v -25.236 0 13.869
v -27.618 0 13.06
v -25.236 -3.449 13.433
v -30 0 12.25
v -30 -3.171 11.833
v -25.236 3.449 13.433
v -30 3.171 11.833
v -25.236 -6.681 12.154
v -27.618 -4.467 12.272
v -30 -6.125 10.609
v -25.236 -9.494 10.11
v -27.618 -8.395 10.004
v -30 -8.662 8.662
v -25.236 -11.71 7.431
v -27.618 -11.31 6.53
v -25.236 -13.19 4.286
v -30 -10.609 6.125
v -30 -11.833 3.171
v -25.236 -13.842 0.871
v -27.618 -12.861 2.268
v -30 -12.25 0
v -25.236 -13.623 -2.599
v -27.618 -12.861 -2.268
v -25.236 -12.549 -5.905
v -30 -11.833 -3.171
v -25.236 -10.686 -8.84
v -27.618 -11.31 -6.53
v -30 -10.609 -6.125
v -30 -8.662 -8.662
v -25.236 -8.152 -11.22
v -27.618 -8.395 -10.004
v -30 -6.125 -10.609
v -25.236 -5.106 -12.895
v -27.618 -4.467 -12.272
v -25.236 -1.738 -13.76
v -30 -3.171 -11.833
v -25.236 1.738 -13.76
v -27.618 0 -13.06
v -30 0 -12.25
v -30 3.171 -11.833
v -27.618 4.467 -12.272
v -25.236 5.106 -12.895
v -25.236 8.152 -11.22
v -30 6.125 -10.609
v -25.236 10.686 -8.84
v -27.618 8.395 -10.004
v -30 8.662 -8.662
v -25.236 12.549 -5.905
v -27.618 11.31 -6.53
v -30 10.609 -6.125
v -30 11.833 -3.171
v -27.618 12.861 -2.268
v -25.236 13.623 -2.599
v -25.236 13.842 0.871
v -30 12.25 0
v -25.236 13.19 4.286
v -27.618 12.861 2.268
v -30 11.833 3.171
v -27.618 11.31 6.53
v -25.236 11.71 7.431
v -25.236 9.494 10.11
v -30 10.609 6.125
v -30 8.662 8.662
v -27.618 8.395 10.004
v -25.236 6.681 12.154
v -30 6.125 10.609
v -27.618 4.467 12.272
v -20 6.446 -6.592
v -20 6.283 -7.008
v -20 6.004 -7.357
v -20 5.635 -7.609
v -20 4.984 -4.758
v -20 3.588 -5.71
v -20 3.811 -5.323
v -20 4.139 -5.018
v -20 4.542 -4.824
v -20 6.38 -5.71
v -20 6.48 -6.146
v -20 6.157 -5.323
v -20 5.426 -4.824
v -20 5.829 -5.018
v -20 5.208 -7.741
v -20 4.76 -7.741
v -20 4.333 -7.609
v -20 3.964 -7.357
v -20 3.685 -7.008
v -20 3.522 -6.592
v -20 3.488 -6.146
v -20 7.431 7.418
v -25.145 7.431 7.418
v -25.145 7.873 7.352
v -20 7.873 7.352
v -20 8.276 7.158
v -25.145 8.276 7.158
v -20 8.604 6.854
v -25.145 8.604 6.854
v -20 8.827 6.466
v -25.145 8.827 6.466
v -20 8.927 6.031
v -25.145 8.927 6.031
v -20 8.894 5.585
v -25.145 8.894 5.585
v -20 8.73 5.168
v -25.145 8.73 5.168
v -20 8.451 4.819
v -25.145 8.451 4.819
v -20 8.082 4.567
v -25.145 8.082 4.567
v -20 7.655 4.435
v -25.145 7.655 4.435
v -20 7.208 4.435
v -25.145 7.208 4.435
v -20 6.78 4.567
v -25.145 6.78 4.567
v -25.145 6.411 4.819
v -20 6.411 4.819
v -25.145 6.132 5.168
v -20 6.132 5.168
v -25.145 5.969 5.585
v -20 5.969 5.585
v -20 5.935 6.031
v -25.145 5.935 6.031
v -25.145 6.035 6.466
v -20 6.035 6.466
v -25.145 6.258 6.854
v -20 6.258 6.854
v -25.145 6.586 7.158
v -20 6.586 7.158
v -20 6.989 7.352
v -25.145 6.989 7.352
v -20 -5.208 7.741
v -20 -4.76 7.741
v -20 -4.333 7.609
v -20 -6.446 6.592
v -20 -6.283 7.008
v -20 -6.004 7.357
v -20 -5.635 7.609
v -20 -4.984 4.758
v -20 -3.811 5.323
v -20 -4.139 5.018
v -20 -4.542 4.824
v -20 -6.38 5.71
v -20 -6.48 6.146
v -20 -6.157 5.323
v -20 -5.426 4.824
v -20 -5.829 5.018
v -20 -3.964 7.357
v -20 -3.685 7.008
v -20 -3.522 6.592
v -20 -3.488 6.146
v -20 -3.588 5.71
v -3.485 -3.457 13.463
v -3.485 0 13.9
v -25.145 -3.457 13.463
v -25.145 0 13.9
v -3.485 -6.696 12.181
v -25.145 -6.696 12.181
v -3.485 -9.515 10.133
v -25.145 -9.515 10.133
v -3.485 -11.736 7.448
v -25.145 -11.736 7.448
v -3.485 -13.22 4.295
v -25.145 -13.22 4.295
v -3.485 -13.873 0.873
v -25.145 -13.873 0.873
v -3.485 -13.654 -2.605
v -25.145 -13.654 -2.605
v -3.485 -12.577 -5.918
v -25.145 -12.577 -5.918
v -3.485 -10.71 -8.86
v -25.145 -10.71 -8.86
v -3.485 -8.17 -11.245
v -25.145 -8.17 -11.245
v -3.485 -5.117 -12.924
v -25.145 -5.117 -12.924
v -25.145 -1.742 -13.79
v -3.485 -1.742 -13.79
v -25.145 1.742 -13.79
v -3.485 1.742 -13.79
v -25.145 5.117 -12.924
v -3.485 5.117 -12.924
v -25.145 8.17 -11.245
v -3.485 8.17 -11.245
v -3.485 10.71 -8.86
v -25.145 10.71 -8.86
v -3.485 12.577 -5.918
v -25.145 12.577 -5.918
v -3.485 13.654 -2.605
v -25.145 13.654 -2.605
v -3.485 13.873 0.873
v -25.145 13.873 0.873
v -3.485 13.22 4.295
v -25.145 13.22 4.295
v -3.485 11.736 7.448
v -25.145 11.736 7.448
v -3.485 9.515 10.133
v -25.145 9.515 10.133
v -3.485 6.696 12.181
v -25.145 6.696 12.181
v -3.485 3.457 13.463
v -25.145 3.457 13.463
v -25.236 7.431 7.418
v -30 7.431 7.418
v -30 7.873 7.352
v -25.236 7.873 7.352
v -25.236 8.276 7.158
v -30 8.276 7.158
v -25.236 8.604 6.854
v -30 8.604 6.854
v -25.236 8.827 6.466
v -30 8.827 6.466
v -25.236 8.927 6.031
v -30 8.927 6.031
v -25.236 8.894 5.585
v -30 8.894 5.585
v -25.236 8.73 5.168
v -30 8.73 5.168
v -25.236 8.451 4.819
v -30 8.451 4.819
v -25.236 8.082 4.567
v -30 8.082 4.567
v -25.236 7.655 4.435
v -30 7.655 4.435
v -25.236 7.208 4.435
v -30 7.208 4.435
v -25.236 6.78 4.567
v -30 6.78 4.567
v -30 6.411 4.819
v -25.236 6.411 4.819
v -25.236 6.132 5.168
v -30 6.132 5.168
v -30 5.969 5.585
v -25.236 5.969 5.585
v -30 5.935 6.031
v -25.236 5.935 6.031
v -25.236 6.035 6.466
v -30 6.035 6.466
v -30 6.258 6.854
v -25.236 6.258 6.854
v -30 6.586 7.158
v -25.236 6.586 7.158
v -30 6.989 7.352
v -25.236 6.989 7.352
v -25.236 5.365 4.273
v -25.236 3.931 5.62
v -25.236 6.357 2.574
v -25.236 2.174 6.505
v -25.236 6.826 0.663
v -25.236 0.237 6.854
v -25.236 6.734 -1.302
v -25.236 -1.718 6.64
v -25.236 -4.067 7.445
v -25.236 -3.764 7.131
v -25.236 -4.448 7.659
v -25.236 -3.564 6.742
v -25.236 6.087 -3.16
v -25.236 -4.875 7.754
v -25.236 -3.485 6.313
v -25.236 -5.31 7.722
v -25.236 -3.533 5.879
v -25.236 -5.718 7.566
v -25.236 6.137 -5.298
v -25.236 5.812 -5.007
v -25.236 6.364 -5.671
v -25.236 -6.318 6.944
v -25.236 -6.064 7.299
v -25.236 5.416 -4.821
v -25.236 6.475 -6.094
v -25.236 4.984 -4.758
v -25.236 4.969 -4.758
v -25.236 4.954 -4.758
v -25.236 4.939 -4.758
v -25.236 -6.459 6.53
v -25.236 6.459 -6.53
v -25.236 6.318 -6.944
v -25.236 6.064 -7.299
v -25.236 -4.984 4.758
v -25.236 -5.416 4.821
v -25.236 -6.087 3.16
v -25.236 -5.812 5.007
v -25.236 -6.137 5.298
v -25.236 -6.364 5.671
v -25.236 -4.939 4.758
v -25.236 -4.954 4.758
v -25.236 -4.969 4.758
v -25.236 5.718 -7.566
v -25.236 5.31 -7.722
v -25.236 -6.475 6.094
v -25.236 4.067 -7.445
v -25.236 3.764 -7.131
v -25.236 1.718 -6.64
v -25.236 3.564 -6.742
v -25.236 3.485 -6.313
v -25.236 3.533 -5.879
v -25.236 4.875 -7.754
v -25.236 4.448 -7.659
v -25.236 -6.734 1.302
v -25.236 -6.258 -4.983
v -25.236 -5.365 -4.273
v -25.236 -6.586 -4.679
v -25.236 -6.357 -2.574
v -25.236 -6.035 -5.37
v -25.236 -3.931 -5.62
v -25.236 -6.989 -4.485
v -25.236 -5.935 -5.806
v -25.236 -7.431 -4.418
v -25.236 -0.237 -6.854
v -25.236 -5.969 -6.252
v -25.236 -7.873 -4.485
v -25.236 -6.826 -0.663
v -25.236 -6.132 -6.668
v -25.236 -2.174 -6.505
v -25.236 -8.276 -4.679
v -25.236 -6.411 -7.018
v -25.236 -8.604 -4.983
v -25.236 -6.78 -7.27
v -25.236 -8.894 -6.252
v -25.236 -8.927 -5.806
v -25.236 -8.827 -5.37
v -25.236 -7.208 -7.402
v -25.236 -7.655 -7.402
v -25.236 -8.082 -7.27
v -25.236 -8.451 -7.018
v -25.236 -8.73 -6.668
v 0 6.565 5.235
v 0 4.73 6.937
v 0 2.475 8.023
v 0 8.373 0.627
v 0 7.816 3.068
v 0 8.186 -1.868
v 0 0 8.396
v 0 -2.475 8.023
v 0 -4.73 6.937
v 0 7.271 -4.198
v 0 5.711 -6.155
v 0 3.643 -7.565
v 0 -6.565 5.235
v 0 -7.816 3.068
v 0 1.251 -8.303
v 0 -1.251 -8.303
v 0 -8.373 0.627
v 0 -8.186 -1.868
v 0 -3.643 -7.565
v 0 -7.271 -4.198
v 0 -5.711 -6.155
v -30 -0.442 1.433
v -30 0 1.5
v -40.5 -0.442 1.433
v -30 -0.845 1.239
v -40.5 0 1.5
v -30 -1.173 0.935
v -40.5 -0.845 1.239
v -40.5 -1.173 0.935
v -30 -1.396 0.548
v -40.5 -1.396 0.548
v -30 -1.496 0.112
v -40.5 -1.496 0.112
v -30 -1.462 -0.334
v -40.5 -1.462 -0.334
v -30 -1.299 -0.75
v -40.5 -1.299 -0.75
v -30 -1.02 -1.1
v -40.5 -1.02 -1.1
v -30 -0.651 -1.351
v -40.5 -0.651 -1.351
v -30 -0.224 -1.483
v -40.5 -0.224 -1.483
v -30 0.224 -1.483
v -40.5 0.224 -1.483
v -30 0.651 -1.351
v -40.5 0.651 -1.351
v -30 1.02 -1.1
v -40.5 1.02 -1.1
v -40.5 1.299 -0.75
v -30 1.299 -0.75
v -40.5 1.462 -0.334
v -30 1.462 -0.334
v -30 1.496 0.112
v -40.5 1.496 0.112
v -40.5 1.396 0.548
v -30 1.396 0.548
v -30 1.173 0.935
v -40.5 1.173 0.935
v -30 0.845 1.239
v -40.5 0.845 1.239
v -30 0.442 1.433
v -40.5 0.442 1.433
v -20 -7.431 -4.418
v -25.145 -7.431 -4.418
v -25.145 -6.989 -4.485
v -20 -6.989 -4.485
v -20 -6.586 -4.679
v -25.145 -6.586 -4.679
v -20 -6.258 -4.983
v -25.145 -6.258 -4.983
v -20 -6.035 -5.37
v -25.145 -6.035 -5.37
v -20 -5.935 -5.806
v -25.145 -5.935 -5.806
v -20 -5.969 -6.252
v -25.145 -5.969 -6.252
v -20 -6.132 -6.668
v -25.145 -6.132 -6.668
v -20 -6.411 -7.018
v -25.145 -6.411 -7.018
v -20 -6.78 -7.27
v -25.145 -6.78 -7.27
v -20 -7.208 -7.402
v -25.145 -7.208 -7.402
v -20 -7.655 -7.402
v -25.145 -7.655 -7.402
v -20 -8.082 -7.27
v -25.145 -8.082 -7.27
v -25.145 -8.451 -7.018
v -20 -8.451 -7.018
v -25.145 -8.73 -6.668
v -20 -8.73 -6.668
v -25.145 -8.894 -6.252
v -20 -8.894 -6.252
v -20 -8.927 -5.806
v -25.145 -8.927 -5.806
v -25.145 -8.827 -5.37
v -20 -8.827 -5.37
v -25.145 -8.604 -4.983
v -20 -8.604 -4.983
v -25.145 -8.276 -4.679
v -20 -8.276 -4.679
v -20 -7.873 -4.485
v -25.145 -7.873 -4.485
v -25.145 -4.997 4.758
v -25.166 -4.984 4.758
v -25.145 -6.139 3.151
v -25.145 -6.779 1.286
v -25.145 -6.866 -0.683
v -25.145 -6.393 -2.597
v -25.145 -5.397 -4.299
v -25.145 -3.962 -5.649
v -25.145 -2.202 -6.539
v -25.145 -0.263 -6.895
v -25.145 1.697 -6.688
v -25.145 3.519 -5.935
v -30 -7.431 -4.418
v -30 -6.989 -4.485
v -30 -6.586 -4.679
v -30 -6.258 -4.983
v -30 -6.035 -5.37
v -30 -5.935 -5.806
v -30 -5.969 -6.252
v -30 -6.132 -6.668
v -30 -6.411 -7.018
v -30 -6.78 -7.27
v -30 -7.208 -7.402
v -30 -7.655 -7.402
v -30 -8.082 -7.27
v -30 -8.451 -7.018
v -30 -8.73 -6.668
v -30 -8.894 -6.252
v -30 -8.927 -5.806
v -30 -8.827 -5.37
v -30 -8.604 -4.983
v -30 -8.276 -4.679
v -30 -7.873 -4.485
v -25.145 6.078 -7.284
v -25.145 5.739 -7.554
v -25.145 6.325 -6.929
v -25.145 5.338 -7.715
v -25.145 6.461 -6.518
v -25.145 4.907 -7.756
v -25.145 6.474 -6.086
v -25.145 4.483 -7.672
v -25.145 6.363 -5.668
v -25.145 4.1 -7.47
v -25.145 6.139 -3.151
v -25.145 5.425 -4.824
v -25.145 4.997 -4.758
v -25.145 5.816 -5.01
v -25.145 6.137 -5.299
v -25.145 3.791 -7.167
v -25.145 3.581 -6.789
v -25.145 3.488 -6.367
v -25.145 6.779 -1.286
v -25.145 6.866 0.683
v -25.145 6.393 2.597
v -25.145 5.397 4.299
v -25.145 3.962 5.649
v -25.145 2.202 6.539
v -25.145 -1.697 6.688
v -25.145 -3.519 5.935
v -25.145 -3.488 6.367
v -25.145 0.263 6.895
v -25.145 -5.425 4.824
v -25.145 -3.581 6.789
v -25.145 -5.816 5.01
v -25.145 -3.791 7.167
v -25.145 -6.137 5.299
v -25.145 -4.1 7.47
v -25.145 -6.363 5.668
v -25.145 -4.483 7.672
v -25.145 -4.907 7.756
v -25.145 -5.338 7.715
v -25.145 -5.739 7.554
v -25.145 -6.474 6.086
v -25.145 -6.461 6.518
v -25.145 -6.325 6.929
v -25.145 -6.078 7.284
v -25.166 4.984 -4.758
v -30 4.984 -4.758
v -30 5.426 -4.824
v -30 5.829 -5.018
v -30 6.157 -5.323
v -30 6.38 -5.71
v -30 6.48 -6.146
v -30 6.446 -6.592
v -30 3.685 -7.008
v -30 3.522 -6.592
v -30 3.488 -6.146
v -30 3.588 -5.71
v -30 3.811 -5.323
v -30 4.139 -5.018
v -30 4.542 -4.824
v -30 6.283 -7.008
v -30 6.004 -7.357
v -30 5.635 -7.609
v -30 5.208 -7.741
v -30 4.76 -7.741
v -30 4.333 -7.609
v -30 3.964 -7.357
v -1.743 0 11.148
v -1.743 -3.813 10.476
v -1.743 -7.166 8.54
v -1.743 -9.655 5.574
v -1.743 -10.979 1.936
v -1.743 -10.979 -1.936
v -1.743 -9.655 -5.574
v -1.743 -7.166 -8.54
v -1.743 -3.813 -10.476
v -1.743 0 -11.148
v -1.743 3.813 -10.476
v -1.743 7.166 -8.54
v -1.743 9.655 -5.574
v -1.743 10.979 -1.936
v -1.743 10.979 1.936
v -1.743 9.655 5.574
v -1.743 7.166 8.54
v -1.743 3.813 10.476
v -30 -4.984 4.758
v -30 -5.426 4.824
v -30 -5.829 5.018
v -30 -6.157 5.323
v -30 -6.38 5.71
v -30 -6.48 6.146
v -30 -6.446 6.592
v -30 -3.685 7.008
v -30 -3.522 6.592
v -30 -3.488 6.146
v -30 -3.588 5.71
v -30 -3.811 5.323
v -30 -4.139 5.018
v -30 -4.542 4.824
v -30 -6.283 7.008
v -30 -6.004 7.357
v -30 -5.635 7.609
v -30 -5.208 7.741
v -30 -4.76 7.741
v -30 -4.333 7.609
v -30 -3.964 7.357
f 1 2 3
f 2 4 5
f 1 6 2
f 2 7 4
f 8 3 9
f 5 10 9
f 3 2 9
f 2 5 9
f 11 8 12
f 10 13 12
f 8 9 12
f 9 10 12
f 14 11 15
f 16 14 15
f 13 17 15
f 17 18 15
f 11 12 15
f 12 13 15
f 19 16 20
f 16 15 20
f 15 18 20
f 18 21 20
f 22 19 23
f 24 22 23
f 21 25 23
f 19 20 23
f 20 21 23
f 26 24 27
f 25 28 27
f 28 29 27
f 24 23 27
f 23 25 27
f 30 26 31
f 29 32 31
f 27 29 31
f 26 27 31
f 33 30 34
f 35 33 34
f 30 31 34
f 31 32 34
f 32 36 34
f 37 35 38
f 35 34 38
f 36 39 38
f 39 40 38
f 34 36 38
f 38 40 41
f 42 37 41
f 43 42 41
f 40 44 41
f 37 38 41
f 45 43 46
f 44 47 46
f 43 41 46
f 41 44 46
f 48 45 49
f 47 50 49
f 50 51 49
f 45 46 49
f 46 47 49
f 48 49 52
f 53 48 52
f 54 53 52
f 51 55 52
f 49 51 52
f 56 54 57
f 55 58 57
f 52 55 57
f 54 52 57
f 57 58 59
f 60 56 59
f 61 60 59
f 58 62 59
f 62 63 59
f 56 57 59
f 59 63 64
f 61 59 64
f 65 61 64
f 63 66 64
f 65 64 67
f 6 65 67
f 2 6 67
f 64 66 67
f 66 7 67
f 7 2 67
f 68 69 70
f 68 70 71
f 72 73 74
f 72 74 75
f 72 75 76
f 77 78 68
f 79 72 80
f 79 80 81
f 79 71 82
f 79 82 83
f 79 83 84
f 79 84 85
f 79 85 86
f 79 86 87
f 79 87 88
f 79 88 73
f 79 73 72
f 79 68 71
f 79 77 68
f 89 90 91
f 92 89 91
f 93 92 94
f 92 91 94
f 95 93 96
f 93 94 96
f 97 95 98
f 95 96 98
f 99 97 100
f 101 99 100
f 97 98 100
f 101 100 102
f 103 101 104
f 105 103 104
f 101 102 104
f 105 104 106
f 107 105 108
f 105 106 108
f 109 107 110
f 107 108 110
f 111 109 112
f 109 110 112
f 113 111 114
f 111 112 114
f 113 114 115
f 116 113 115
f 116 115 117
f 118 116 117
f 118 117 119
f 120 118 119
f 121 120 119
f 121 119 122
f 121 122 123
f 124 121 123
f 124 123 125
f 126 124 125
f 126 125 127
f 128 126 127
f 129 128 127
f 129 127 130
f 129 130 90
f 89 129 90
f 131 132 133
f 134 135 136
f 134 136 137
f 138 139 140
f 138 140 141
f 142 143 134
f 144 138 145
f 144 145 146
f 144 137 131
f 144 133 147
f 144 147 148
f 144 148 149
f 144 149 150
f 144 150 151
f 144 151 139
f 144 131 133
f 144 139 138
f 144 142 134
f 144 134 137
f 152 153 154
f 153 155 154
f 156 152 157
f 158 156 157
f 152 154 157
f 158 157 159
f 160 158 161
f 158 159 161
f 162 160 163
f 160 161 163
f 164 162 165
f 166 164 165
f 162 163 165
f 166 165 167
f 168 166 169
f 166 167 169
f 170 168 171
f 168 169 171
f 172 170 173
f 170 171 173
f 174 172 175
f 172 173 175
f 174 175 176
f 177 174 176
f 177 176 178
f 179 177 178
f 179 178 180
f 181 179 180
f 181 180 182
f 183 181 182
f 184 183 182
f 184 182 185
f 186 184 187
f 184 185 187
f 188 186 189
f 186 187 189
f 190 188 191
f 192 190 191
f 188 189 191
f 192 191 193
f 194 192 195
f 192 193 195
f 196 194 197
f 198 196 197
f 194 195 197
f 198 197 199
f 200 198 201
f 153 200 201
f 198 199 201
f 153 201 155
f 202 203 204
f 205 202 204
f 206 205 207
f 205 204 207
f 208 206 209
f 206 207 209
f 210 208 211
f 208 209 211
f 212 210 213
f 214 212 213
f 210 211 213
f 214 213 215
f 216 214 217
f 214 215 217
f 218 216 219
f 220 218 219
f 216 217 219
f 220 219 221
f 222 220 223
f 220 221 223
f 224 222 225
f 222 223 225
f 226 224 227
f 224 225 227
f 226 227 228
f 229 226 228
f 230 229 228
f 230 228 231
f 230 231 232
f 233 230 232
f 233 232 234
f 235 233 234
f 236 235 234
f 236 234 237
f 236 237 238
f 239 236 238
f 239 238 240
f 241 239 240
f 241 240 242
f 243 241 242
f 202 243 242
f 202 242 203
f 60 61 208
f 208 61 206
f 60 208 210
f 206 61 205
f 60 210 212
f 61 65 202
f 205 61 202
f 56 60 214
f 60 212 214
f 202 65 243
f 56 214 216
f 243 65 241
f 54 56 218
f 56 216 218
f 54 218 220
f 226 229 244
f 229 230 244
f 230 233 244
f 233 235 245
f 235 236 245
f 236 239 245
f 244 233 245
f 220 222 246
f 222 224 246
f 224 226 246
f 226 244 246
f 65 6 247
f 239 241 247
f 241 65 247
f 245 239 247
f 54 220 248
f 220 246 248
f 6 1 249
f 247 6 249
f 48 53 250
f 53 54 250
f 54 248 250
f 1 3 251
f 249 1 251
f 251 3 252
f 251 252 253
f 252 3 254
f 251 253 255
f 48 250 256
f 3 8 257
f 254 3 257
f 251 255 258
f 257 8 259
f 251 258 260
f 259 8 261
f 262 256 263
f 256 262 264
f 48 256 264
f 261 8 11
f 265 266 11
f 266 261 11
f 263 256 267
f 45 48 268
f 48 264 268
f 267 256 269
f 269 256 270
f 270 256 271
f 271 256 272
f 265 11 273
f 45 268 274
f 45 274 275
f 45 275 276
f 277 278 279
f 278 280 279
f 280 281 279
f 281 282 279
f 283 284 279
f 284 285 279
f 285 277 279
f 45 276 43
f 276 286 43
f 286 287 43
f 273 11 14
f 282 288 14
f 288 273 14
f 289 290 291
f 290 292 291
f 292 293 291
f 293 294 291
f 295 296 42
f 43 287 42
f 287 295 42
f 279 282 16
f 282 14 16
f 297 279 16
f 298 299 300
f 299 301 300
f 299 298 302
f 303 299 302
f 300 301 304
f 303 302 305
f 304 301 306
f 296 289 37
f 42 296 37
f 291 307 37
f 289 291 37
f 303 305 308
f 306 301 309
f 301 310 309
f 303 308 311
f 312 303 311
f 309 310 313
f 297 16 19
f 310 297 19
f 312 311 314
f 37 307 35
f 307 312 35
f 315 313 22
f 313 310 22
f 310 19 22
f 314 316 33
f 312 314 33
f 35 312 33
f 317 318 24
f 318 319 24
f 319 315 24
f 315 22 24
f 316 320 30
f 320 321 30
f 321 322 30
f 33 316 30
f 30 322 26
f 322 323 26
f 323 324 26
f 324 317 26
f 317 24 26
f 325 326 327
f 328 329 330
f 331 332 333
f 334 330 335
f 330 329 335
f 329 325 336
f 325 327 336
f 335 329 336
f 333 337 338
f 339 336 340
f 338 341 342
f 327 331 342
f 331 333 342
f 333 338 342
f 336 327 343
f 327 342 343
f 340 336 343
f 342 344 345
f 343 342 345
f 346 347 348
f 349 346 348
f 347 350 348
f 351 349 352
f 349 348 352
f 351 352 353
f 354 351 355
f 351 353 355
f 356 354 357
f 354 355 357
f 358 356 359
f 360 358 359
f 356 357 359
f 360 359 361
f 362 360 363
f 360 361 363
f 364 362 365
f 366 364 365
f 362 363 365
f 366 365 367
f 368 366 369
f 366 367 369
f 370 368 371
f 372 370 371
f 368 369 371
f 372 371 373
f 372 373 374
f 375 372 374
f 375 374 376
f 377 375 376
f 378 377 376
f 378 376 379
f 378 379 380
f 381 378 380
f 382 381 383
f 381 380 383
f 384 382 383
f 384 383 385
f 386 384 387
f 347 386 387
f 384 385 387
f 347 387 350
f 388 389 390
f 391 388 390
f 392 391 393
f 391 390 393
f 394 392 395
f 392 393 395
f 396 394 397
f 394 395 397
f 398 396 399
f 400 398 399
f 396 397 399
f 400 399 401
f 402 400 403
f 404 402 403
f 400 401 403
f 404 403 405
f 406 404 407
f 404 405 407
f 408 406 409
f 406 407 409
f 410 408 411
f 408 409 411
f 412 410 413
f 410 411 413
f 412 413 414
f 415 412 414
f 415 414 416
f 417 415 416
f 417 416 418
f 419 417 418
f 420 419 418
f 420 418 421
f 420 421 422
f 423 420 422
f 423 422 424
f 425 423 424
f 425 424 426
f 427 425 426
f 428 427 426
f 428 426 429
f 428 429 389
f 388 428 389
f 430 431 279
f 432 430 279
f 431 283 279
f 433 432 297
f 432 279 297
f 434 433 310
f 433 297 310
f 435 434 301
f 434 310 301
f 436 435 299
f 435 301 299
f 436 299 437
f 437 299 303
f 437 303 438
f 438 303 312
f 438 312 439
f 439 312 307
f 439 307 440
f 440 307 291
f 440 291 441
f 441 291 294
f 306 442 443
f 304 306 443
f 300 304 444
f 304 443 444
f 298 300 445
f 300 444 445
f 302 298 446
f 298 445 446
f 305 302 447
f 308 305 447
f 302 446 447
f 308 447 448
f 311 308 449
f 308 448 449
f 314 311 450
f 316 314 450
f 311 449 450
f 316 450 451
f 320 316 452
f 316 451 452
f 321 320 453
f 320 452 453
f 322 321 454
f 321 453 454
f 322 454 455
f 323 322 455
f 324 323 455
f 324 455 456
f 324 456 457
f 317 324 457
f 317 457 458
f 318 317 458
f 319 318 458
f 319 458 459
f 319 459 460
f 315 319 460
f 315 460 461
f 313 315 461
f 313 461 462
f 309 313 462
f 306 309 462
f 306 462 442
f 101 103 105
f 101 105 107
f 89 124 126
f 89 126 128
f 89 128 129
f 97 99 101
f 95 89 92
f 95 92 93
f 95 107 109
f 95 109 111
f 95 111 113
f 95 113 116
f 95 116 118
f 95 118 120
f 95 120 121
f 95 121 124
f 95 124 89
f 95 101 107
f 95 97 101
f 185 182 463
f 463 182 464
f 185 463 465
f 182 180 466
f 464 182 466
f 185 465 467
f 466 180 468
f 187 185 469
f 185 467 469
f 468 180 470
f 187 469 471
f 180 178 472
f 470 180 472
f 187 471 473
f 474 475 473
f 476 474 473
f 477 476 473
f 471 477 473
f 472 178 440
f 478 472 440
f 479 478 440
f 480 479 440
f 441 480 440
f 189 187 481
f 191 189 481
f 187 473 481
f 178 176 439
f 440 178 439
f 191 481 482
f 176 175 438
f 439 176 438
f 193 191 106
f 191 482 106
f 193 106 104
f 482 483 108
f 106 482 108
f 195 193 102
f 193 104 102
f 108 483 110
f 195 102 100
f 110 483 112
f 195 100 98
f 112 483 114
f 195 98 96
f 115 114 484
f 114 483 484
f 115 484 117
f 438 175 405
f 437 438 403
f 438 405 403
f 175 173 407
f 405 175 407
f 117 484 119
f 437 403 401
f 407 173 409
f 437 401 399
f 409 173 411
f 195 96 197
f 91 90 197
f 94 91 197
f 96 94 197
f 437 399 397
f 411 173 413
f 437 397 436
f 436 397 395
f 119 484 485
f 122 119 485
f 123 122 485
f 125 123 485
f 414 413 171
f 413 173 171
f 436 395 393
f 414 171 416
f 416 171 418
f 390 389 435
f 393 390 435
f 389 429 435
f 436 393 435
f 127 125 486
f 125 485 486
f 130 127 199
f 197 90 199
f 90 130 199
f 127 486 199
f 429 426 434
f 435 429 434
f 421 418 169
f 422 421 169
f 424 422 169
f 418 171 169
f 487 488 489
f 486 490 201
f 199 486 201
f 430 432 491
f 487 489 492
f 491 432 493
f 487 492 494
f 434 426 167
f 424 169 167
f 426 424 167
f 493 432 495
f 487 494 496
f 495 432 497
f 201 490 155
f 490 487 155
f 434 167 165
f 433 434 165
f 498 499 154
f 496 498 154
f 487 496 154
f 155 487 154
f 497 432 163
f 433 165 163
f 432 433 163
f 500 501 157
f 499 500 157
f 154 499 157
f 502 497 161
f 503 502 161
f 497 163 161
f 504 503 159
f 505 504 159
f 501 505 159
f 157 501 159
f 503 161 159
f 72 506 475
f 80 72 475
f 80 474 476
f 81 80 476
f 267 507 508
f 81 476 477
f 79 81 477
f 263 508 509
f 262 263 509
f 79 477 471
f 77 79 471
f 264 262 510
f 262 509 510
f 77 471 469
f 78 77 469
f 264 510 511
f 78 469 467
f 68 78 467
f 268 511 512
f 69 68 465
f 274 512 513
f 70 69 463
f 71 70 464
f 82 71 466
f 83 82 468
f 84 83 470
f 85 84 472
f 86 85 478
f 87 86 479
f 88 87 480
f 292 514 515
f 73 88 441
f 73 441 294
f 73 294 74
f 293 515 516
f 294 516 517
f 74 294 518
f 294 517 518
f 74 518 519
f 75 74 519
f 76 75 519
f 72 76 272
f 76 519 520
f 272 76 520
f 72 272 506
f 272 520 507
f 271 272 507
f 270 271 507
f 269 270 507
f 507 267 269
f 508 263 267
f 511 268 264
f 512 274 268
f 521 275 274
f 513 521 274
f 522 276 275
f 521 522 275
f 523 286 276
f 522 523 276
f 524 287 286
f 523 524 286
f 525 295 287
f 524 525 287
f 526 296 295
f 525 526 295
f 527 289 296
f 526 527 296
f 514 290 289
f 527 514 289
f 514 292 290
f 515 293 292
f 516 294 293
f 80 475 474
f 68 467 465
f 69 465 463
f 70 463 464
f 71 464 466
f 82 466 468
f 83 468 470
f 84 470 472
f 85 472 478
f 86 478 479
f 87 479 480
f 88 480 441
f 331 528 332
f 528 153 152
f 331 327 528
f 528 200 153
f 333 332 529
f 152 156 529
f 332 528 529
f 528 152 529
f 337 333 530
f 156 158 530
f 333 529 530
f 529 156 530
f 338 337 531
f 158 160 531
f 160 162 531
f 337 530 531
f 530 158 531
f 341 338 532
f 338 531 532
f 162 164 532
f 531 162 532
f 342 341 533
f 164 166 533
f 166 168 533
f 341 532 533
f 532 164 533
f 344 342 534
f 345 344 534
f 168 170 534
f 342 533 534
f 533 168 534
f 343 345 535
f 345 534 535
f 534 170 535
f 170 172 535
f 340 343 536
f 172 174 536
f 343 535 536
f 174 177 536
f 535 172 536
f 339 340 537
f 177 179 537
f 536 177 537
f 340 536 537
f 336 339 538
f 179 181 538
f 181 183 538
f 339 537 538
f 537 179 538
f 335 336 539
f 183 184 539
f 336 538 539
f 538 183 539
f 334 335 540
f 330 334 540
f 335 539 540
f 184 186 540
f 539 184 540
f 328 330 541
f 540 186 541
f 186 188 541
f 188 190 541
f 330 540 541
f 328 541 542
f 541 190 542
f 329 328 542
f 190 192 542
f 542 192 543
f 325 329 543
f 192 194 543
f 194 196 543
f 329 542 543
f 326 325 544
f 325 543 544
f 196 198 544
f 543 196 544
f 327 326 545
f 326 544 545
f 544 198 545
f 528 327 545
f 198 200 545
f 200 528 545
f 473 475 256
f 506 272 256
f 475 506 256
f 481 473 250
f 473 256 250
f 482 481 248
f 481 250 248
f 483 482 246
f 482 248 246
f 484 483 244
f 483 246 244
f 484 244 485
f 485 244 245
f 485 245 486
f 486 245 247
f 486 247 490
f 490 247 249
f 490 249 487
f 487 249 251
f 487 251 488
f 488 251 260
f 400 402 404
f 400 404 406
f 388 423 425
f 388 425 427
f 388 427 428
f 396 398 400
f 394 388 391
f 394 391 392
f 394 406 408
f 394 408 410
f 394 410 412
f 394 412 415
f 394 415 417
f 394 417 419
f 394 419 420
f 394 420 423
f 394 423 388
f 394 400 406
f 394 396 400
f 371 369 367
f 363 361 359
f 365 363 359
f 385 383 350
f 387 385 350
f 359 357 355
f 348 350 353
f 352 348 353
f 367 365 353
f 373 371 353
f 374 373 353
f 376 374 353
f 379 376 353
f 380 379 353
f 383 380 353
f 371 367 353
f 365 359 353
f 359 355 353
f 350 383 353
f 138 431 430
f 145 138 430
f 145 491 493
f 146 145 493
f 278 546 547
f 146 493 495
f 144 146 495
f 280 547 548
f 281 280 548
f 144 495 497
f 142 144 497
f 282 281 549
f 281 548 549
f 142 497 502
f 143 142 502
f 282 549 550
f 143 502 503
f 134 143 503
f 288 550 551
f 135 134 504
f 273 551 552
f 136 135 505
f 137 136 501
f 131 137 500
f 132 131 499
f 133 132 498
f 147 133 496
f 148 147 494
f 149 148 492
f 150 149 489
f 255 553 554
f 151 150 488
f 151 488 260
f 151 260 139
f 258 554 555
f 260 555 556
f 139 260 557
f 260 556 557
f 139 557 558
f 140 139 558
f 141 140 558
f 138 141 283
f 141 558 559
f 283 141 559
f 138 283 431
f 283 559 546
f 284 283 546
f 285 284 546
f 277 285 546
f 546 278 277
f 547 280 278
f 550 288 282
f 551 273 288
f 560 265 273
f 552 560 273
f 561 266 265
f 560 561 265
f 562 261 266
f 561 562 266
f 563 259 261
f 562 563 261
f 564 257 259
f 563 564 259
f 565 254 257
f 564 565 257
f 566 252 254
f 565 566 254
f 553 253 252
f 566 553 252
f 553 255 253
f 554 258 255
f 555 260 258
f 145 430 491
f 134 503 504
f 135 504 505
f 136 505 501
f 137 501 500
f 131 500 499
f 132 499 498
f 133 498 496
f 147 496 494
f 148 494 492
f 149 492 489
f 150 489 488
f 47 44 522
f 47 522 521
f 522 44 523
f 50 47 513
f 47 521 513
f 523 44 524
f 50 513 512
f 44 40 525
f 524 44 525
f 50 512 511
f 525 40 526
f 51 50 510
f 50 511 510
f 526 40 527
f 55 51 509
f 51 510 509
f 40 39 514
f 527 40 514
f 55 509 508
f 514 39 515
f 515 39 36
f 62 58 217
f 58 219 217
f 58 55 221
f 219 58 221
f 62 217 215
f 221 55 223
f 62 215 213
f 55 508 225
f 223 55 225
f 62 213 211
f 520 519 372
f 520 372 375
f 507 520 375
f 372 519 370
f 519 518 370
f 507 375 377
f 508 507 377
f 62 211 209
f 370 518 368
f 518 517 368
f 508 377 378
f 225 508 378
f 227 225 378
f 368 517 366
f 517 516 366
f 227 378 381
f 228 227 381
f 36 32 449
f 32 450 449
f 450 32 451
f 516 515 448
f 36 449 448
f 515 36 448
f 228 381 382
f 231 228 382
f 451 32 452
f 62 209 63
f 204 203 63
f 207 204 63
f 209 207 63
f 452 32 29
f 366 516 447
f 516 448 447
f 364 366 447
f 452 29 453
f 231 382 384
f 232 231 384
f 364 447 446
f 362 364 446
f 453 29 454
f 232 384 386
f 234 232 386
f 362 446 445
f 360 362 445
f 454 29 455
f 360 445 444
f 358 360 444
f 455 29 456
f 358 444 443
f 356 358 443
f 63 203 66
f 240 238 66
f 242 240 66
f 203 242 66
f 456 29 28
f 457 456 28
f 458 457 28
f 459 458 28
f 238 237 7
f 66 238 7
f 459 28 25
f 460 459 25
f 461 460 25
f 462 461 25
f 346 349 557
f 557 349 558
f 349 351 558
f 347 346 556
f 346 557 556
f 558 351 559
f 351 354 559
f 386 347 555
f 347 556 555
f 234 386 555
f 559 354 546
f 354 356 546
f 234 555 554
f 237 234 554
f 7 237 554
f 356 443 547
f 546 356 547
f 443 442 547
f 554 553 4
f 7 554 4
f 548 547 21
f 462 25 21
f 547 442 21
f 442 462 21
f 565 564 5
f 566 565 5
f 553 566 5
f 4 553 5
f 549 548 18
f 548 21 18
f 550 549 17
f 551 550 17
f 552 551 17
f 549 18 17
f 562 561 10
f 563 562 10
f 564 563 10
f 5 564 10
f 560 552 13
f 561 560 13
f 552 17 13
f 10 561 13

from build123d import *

# Parameters (mm, degrees)
SKETCH2_R          = 1.5
CUT_EXTRUDE1_DEPTH = 10


with BuildPart() as part:
    # Sketch1 → Revolve2 (revolve)
    with BuildSketch(Plane.XY, mode=Mode.PRIVATE) as revolve2_sk:
        Polygon((-25.236130379, 13.869097433), (-30, 12.25), (-30, 1.5), (-40.5, 1.5), (-40.5, 0), (0, 0), (0, 8.396394587), (-3.485025076, 13.9), (-25.145205772, 13.9), (-25.145205772, 6.9), (-25.236130379, 6.858374097), align=None)
    revolve(revolve2_sk.sketch.rotate(Axis((-72.504474406, 0, 0), (1, 0, 0)), 90), axis=Axis((-72.504474406, 0, 0), (1, 0, 0)))

    # Sketch2 → Cut-Extrude1 (cut)
    with BuildSketch(Plane.ZY.offset(30)):
        with Locations((5.918430072, 7.431163131)):
            Circle(SKETCH2_R)
        with Locations((-6.257821584, 4.983941113)):
            Circle(SKETCH2_R)
        with Locations(Location((6.257821584, -4.983941113, 0), (0, 0, 180))):
            Circle(SKETCH2_R)
        with Locations((-5.918430072, -7.431163131)):
            Circle(SKETCH2_R)
    extrude(amount=-CUT_EXTRUDE1_DEPTH, mode=Mode.SUBTRACT)


solid = part.part
